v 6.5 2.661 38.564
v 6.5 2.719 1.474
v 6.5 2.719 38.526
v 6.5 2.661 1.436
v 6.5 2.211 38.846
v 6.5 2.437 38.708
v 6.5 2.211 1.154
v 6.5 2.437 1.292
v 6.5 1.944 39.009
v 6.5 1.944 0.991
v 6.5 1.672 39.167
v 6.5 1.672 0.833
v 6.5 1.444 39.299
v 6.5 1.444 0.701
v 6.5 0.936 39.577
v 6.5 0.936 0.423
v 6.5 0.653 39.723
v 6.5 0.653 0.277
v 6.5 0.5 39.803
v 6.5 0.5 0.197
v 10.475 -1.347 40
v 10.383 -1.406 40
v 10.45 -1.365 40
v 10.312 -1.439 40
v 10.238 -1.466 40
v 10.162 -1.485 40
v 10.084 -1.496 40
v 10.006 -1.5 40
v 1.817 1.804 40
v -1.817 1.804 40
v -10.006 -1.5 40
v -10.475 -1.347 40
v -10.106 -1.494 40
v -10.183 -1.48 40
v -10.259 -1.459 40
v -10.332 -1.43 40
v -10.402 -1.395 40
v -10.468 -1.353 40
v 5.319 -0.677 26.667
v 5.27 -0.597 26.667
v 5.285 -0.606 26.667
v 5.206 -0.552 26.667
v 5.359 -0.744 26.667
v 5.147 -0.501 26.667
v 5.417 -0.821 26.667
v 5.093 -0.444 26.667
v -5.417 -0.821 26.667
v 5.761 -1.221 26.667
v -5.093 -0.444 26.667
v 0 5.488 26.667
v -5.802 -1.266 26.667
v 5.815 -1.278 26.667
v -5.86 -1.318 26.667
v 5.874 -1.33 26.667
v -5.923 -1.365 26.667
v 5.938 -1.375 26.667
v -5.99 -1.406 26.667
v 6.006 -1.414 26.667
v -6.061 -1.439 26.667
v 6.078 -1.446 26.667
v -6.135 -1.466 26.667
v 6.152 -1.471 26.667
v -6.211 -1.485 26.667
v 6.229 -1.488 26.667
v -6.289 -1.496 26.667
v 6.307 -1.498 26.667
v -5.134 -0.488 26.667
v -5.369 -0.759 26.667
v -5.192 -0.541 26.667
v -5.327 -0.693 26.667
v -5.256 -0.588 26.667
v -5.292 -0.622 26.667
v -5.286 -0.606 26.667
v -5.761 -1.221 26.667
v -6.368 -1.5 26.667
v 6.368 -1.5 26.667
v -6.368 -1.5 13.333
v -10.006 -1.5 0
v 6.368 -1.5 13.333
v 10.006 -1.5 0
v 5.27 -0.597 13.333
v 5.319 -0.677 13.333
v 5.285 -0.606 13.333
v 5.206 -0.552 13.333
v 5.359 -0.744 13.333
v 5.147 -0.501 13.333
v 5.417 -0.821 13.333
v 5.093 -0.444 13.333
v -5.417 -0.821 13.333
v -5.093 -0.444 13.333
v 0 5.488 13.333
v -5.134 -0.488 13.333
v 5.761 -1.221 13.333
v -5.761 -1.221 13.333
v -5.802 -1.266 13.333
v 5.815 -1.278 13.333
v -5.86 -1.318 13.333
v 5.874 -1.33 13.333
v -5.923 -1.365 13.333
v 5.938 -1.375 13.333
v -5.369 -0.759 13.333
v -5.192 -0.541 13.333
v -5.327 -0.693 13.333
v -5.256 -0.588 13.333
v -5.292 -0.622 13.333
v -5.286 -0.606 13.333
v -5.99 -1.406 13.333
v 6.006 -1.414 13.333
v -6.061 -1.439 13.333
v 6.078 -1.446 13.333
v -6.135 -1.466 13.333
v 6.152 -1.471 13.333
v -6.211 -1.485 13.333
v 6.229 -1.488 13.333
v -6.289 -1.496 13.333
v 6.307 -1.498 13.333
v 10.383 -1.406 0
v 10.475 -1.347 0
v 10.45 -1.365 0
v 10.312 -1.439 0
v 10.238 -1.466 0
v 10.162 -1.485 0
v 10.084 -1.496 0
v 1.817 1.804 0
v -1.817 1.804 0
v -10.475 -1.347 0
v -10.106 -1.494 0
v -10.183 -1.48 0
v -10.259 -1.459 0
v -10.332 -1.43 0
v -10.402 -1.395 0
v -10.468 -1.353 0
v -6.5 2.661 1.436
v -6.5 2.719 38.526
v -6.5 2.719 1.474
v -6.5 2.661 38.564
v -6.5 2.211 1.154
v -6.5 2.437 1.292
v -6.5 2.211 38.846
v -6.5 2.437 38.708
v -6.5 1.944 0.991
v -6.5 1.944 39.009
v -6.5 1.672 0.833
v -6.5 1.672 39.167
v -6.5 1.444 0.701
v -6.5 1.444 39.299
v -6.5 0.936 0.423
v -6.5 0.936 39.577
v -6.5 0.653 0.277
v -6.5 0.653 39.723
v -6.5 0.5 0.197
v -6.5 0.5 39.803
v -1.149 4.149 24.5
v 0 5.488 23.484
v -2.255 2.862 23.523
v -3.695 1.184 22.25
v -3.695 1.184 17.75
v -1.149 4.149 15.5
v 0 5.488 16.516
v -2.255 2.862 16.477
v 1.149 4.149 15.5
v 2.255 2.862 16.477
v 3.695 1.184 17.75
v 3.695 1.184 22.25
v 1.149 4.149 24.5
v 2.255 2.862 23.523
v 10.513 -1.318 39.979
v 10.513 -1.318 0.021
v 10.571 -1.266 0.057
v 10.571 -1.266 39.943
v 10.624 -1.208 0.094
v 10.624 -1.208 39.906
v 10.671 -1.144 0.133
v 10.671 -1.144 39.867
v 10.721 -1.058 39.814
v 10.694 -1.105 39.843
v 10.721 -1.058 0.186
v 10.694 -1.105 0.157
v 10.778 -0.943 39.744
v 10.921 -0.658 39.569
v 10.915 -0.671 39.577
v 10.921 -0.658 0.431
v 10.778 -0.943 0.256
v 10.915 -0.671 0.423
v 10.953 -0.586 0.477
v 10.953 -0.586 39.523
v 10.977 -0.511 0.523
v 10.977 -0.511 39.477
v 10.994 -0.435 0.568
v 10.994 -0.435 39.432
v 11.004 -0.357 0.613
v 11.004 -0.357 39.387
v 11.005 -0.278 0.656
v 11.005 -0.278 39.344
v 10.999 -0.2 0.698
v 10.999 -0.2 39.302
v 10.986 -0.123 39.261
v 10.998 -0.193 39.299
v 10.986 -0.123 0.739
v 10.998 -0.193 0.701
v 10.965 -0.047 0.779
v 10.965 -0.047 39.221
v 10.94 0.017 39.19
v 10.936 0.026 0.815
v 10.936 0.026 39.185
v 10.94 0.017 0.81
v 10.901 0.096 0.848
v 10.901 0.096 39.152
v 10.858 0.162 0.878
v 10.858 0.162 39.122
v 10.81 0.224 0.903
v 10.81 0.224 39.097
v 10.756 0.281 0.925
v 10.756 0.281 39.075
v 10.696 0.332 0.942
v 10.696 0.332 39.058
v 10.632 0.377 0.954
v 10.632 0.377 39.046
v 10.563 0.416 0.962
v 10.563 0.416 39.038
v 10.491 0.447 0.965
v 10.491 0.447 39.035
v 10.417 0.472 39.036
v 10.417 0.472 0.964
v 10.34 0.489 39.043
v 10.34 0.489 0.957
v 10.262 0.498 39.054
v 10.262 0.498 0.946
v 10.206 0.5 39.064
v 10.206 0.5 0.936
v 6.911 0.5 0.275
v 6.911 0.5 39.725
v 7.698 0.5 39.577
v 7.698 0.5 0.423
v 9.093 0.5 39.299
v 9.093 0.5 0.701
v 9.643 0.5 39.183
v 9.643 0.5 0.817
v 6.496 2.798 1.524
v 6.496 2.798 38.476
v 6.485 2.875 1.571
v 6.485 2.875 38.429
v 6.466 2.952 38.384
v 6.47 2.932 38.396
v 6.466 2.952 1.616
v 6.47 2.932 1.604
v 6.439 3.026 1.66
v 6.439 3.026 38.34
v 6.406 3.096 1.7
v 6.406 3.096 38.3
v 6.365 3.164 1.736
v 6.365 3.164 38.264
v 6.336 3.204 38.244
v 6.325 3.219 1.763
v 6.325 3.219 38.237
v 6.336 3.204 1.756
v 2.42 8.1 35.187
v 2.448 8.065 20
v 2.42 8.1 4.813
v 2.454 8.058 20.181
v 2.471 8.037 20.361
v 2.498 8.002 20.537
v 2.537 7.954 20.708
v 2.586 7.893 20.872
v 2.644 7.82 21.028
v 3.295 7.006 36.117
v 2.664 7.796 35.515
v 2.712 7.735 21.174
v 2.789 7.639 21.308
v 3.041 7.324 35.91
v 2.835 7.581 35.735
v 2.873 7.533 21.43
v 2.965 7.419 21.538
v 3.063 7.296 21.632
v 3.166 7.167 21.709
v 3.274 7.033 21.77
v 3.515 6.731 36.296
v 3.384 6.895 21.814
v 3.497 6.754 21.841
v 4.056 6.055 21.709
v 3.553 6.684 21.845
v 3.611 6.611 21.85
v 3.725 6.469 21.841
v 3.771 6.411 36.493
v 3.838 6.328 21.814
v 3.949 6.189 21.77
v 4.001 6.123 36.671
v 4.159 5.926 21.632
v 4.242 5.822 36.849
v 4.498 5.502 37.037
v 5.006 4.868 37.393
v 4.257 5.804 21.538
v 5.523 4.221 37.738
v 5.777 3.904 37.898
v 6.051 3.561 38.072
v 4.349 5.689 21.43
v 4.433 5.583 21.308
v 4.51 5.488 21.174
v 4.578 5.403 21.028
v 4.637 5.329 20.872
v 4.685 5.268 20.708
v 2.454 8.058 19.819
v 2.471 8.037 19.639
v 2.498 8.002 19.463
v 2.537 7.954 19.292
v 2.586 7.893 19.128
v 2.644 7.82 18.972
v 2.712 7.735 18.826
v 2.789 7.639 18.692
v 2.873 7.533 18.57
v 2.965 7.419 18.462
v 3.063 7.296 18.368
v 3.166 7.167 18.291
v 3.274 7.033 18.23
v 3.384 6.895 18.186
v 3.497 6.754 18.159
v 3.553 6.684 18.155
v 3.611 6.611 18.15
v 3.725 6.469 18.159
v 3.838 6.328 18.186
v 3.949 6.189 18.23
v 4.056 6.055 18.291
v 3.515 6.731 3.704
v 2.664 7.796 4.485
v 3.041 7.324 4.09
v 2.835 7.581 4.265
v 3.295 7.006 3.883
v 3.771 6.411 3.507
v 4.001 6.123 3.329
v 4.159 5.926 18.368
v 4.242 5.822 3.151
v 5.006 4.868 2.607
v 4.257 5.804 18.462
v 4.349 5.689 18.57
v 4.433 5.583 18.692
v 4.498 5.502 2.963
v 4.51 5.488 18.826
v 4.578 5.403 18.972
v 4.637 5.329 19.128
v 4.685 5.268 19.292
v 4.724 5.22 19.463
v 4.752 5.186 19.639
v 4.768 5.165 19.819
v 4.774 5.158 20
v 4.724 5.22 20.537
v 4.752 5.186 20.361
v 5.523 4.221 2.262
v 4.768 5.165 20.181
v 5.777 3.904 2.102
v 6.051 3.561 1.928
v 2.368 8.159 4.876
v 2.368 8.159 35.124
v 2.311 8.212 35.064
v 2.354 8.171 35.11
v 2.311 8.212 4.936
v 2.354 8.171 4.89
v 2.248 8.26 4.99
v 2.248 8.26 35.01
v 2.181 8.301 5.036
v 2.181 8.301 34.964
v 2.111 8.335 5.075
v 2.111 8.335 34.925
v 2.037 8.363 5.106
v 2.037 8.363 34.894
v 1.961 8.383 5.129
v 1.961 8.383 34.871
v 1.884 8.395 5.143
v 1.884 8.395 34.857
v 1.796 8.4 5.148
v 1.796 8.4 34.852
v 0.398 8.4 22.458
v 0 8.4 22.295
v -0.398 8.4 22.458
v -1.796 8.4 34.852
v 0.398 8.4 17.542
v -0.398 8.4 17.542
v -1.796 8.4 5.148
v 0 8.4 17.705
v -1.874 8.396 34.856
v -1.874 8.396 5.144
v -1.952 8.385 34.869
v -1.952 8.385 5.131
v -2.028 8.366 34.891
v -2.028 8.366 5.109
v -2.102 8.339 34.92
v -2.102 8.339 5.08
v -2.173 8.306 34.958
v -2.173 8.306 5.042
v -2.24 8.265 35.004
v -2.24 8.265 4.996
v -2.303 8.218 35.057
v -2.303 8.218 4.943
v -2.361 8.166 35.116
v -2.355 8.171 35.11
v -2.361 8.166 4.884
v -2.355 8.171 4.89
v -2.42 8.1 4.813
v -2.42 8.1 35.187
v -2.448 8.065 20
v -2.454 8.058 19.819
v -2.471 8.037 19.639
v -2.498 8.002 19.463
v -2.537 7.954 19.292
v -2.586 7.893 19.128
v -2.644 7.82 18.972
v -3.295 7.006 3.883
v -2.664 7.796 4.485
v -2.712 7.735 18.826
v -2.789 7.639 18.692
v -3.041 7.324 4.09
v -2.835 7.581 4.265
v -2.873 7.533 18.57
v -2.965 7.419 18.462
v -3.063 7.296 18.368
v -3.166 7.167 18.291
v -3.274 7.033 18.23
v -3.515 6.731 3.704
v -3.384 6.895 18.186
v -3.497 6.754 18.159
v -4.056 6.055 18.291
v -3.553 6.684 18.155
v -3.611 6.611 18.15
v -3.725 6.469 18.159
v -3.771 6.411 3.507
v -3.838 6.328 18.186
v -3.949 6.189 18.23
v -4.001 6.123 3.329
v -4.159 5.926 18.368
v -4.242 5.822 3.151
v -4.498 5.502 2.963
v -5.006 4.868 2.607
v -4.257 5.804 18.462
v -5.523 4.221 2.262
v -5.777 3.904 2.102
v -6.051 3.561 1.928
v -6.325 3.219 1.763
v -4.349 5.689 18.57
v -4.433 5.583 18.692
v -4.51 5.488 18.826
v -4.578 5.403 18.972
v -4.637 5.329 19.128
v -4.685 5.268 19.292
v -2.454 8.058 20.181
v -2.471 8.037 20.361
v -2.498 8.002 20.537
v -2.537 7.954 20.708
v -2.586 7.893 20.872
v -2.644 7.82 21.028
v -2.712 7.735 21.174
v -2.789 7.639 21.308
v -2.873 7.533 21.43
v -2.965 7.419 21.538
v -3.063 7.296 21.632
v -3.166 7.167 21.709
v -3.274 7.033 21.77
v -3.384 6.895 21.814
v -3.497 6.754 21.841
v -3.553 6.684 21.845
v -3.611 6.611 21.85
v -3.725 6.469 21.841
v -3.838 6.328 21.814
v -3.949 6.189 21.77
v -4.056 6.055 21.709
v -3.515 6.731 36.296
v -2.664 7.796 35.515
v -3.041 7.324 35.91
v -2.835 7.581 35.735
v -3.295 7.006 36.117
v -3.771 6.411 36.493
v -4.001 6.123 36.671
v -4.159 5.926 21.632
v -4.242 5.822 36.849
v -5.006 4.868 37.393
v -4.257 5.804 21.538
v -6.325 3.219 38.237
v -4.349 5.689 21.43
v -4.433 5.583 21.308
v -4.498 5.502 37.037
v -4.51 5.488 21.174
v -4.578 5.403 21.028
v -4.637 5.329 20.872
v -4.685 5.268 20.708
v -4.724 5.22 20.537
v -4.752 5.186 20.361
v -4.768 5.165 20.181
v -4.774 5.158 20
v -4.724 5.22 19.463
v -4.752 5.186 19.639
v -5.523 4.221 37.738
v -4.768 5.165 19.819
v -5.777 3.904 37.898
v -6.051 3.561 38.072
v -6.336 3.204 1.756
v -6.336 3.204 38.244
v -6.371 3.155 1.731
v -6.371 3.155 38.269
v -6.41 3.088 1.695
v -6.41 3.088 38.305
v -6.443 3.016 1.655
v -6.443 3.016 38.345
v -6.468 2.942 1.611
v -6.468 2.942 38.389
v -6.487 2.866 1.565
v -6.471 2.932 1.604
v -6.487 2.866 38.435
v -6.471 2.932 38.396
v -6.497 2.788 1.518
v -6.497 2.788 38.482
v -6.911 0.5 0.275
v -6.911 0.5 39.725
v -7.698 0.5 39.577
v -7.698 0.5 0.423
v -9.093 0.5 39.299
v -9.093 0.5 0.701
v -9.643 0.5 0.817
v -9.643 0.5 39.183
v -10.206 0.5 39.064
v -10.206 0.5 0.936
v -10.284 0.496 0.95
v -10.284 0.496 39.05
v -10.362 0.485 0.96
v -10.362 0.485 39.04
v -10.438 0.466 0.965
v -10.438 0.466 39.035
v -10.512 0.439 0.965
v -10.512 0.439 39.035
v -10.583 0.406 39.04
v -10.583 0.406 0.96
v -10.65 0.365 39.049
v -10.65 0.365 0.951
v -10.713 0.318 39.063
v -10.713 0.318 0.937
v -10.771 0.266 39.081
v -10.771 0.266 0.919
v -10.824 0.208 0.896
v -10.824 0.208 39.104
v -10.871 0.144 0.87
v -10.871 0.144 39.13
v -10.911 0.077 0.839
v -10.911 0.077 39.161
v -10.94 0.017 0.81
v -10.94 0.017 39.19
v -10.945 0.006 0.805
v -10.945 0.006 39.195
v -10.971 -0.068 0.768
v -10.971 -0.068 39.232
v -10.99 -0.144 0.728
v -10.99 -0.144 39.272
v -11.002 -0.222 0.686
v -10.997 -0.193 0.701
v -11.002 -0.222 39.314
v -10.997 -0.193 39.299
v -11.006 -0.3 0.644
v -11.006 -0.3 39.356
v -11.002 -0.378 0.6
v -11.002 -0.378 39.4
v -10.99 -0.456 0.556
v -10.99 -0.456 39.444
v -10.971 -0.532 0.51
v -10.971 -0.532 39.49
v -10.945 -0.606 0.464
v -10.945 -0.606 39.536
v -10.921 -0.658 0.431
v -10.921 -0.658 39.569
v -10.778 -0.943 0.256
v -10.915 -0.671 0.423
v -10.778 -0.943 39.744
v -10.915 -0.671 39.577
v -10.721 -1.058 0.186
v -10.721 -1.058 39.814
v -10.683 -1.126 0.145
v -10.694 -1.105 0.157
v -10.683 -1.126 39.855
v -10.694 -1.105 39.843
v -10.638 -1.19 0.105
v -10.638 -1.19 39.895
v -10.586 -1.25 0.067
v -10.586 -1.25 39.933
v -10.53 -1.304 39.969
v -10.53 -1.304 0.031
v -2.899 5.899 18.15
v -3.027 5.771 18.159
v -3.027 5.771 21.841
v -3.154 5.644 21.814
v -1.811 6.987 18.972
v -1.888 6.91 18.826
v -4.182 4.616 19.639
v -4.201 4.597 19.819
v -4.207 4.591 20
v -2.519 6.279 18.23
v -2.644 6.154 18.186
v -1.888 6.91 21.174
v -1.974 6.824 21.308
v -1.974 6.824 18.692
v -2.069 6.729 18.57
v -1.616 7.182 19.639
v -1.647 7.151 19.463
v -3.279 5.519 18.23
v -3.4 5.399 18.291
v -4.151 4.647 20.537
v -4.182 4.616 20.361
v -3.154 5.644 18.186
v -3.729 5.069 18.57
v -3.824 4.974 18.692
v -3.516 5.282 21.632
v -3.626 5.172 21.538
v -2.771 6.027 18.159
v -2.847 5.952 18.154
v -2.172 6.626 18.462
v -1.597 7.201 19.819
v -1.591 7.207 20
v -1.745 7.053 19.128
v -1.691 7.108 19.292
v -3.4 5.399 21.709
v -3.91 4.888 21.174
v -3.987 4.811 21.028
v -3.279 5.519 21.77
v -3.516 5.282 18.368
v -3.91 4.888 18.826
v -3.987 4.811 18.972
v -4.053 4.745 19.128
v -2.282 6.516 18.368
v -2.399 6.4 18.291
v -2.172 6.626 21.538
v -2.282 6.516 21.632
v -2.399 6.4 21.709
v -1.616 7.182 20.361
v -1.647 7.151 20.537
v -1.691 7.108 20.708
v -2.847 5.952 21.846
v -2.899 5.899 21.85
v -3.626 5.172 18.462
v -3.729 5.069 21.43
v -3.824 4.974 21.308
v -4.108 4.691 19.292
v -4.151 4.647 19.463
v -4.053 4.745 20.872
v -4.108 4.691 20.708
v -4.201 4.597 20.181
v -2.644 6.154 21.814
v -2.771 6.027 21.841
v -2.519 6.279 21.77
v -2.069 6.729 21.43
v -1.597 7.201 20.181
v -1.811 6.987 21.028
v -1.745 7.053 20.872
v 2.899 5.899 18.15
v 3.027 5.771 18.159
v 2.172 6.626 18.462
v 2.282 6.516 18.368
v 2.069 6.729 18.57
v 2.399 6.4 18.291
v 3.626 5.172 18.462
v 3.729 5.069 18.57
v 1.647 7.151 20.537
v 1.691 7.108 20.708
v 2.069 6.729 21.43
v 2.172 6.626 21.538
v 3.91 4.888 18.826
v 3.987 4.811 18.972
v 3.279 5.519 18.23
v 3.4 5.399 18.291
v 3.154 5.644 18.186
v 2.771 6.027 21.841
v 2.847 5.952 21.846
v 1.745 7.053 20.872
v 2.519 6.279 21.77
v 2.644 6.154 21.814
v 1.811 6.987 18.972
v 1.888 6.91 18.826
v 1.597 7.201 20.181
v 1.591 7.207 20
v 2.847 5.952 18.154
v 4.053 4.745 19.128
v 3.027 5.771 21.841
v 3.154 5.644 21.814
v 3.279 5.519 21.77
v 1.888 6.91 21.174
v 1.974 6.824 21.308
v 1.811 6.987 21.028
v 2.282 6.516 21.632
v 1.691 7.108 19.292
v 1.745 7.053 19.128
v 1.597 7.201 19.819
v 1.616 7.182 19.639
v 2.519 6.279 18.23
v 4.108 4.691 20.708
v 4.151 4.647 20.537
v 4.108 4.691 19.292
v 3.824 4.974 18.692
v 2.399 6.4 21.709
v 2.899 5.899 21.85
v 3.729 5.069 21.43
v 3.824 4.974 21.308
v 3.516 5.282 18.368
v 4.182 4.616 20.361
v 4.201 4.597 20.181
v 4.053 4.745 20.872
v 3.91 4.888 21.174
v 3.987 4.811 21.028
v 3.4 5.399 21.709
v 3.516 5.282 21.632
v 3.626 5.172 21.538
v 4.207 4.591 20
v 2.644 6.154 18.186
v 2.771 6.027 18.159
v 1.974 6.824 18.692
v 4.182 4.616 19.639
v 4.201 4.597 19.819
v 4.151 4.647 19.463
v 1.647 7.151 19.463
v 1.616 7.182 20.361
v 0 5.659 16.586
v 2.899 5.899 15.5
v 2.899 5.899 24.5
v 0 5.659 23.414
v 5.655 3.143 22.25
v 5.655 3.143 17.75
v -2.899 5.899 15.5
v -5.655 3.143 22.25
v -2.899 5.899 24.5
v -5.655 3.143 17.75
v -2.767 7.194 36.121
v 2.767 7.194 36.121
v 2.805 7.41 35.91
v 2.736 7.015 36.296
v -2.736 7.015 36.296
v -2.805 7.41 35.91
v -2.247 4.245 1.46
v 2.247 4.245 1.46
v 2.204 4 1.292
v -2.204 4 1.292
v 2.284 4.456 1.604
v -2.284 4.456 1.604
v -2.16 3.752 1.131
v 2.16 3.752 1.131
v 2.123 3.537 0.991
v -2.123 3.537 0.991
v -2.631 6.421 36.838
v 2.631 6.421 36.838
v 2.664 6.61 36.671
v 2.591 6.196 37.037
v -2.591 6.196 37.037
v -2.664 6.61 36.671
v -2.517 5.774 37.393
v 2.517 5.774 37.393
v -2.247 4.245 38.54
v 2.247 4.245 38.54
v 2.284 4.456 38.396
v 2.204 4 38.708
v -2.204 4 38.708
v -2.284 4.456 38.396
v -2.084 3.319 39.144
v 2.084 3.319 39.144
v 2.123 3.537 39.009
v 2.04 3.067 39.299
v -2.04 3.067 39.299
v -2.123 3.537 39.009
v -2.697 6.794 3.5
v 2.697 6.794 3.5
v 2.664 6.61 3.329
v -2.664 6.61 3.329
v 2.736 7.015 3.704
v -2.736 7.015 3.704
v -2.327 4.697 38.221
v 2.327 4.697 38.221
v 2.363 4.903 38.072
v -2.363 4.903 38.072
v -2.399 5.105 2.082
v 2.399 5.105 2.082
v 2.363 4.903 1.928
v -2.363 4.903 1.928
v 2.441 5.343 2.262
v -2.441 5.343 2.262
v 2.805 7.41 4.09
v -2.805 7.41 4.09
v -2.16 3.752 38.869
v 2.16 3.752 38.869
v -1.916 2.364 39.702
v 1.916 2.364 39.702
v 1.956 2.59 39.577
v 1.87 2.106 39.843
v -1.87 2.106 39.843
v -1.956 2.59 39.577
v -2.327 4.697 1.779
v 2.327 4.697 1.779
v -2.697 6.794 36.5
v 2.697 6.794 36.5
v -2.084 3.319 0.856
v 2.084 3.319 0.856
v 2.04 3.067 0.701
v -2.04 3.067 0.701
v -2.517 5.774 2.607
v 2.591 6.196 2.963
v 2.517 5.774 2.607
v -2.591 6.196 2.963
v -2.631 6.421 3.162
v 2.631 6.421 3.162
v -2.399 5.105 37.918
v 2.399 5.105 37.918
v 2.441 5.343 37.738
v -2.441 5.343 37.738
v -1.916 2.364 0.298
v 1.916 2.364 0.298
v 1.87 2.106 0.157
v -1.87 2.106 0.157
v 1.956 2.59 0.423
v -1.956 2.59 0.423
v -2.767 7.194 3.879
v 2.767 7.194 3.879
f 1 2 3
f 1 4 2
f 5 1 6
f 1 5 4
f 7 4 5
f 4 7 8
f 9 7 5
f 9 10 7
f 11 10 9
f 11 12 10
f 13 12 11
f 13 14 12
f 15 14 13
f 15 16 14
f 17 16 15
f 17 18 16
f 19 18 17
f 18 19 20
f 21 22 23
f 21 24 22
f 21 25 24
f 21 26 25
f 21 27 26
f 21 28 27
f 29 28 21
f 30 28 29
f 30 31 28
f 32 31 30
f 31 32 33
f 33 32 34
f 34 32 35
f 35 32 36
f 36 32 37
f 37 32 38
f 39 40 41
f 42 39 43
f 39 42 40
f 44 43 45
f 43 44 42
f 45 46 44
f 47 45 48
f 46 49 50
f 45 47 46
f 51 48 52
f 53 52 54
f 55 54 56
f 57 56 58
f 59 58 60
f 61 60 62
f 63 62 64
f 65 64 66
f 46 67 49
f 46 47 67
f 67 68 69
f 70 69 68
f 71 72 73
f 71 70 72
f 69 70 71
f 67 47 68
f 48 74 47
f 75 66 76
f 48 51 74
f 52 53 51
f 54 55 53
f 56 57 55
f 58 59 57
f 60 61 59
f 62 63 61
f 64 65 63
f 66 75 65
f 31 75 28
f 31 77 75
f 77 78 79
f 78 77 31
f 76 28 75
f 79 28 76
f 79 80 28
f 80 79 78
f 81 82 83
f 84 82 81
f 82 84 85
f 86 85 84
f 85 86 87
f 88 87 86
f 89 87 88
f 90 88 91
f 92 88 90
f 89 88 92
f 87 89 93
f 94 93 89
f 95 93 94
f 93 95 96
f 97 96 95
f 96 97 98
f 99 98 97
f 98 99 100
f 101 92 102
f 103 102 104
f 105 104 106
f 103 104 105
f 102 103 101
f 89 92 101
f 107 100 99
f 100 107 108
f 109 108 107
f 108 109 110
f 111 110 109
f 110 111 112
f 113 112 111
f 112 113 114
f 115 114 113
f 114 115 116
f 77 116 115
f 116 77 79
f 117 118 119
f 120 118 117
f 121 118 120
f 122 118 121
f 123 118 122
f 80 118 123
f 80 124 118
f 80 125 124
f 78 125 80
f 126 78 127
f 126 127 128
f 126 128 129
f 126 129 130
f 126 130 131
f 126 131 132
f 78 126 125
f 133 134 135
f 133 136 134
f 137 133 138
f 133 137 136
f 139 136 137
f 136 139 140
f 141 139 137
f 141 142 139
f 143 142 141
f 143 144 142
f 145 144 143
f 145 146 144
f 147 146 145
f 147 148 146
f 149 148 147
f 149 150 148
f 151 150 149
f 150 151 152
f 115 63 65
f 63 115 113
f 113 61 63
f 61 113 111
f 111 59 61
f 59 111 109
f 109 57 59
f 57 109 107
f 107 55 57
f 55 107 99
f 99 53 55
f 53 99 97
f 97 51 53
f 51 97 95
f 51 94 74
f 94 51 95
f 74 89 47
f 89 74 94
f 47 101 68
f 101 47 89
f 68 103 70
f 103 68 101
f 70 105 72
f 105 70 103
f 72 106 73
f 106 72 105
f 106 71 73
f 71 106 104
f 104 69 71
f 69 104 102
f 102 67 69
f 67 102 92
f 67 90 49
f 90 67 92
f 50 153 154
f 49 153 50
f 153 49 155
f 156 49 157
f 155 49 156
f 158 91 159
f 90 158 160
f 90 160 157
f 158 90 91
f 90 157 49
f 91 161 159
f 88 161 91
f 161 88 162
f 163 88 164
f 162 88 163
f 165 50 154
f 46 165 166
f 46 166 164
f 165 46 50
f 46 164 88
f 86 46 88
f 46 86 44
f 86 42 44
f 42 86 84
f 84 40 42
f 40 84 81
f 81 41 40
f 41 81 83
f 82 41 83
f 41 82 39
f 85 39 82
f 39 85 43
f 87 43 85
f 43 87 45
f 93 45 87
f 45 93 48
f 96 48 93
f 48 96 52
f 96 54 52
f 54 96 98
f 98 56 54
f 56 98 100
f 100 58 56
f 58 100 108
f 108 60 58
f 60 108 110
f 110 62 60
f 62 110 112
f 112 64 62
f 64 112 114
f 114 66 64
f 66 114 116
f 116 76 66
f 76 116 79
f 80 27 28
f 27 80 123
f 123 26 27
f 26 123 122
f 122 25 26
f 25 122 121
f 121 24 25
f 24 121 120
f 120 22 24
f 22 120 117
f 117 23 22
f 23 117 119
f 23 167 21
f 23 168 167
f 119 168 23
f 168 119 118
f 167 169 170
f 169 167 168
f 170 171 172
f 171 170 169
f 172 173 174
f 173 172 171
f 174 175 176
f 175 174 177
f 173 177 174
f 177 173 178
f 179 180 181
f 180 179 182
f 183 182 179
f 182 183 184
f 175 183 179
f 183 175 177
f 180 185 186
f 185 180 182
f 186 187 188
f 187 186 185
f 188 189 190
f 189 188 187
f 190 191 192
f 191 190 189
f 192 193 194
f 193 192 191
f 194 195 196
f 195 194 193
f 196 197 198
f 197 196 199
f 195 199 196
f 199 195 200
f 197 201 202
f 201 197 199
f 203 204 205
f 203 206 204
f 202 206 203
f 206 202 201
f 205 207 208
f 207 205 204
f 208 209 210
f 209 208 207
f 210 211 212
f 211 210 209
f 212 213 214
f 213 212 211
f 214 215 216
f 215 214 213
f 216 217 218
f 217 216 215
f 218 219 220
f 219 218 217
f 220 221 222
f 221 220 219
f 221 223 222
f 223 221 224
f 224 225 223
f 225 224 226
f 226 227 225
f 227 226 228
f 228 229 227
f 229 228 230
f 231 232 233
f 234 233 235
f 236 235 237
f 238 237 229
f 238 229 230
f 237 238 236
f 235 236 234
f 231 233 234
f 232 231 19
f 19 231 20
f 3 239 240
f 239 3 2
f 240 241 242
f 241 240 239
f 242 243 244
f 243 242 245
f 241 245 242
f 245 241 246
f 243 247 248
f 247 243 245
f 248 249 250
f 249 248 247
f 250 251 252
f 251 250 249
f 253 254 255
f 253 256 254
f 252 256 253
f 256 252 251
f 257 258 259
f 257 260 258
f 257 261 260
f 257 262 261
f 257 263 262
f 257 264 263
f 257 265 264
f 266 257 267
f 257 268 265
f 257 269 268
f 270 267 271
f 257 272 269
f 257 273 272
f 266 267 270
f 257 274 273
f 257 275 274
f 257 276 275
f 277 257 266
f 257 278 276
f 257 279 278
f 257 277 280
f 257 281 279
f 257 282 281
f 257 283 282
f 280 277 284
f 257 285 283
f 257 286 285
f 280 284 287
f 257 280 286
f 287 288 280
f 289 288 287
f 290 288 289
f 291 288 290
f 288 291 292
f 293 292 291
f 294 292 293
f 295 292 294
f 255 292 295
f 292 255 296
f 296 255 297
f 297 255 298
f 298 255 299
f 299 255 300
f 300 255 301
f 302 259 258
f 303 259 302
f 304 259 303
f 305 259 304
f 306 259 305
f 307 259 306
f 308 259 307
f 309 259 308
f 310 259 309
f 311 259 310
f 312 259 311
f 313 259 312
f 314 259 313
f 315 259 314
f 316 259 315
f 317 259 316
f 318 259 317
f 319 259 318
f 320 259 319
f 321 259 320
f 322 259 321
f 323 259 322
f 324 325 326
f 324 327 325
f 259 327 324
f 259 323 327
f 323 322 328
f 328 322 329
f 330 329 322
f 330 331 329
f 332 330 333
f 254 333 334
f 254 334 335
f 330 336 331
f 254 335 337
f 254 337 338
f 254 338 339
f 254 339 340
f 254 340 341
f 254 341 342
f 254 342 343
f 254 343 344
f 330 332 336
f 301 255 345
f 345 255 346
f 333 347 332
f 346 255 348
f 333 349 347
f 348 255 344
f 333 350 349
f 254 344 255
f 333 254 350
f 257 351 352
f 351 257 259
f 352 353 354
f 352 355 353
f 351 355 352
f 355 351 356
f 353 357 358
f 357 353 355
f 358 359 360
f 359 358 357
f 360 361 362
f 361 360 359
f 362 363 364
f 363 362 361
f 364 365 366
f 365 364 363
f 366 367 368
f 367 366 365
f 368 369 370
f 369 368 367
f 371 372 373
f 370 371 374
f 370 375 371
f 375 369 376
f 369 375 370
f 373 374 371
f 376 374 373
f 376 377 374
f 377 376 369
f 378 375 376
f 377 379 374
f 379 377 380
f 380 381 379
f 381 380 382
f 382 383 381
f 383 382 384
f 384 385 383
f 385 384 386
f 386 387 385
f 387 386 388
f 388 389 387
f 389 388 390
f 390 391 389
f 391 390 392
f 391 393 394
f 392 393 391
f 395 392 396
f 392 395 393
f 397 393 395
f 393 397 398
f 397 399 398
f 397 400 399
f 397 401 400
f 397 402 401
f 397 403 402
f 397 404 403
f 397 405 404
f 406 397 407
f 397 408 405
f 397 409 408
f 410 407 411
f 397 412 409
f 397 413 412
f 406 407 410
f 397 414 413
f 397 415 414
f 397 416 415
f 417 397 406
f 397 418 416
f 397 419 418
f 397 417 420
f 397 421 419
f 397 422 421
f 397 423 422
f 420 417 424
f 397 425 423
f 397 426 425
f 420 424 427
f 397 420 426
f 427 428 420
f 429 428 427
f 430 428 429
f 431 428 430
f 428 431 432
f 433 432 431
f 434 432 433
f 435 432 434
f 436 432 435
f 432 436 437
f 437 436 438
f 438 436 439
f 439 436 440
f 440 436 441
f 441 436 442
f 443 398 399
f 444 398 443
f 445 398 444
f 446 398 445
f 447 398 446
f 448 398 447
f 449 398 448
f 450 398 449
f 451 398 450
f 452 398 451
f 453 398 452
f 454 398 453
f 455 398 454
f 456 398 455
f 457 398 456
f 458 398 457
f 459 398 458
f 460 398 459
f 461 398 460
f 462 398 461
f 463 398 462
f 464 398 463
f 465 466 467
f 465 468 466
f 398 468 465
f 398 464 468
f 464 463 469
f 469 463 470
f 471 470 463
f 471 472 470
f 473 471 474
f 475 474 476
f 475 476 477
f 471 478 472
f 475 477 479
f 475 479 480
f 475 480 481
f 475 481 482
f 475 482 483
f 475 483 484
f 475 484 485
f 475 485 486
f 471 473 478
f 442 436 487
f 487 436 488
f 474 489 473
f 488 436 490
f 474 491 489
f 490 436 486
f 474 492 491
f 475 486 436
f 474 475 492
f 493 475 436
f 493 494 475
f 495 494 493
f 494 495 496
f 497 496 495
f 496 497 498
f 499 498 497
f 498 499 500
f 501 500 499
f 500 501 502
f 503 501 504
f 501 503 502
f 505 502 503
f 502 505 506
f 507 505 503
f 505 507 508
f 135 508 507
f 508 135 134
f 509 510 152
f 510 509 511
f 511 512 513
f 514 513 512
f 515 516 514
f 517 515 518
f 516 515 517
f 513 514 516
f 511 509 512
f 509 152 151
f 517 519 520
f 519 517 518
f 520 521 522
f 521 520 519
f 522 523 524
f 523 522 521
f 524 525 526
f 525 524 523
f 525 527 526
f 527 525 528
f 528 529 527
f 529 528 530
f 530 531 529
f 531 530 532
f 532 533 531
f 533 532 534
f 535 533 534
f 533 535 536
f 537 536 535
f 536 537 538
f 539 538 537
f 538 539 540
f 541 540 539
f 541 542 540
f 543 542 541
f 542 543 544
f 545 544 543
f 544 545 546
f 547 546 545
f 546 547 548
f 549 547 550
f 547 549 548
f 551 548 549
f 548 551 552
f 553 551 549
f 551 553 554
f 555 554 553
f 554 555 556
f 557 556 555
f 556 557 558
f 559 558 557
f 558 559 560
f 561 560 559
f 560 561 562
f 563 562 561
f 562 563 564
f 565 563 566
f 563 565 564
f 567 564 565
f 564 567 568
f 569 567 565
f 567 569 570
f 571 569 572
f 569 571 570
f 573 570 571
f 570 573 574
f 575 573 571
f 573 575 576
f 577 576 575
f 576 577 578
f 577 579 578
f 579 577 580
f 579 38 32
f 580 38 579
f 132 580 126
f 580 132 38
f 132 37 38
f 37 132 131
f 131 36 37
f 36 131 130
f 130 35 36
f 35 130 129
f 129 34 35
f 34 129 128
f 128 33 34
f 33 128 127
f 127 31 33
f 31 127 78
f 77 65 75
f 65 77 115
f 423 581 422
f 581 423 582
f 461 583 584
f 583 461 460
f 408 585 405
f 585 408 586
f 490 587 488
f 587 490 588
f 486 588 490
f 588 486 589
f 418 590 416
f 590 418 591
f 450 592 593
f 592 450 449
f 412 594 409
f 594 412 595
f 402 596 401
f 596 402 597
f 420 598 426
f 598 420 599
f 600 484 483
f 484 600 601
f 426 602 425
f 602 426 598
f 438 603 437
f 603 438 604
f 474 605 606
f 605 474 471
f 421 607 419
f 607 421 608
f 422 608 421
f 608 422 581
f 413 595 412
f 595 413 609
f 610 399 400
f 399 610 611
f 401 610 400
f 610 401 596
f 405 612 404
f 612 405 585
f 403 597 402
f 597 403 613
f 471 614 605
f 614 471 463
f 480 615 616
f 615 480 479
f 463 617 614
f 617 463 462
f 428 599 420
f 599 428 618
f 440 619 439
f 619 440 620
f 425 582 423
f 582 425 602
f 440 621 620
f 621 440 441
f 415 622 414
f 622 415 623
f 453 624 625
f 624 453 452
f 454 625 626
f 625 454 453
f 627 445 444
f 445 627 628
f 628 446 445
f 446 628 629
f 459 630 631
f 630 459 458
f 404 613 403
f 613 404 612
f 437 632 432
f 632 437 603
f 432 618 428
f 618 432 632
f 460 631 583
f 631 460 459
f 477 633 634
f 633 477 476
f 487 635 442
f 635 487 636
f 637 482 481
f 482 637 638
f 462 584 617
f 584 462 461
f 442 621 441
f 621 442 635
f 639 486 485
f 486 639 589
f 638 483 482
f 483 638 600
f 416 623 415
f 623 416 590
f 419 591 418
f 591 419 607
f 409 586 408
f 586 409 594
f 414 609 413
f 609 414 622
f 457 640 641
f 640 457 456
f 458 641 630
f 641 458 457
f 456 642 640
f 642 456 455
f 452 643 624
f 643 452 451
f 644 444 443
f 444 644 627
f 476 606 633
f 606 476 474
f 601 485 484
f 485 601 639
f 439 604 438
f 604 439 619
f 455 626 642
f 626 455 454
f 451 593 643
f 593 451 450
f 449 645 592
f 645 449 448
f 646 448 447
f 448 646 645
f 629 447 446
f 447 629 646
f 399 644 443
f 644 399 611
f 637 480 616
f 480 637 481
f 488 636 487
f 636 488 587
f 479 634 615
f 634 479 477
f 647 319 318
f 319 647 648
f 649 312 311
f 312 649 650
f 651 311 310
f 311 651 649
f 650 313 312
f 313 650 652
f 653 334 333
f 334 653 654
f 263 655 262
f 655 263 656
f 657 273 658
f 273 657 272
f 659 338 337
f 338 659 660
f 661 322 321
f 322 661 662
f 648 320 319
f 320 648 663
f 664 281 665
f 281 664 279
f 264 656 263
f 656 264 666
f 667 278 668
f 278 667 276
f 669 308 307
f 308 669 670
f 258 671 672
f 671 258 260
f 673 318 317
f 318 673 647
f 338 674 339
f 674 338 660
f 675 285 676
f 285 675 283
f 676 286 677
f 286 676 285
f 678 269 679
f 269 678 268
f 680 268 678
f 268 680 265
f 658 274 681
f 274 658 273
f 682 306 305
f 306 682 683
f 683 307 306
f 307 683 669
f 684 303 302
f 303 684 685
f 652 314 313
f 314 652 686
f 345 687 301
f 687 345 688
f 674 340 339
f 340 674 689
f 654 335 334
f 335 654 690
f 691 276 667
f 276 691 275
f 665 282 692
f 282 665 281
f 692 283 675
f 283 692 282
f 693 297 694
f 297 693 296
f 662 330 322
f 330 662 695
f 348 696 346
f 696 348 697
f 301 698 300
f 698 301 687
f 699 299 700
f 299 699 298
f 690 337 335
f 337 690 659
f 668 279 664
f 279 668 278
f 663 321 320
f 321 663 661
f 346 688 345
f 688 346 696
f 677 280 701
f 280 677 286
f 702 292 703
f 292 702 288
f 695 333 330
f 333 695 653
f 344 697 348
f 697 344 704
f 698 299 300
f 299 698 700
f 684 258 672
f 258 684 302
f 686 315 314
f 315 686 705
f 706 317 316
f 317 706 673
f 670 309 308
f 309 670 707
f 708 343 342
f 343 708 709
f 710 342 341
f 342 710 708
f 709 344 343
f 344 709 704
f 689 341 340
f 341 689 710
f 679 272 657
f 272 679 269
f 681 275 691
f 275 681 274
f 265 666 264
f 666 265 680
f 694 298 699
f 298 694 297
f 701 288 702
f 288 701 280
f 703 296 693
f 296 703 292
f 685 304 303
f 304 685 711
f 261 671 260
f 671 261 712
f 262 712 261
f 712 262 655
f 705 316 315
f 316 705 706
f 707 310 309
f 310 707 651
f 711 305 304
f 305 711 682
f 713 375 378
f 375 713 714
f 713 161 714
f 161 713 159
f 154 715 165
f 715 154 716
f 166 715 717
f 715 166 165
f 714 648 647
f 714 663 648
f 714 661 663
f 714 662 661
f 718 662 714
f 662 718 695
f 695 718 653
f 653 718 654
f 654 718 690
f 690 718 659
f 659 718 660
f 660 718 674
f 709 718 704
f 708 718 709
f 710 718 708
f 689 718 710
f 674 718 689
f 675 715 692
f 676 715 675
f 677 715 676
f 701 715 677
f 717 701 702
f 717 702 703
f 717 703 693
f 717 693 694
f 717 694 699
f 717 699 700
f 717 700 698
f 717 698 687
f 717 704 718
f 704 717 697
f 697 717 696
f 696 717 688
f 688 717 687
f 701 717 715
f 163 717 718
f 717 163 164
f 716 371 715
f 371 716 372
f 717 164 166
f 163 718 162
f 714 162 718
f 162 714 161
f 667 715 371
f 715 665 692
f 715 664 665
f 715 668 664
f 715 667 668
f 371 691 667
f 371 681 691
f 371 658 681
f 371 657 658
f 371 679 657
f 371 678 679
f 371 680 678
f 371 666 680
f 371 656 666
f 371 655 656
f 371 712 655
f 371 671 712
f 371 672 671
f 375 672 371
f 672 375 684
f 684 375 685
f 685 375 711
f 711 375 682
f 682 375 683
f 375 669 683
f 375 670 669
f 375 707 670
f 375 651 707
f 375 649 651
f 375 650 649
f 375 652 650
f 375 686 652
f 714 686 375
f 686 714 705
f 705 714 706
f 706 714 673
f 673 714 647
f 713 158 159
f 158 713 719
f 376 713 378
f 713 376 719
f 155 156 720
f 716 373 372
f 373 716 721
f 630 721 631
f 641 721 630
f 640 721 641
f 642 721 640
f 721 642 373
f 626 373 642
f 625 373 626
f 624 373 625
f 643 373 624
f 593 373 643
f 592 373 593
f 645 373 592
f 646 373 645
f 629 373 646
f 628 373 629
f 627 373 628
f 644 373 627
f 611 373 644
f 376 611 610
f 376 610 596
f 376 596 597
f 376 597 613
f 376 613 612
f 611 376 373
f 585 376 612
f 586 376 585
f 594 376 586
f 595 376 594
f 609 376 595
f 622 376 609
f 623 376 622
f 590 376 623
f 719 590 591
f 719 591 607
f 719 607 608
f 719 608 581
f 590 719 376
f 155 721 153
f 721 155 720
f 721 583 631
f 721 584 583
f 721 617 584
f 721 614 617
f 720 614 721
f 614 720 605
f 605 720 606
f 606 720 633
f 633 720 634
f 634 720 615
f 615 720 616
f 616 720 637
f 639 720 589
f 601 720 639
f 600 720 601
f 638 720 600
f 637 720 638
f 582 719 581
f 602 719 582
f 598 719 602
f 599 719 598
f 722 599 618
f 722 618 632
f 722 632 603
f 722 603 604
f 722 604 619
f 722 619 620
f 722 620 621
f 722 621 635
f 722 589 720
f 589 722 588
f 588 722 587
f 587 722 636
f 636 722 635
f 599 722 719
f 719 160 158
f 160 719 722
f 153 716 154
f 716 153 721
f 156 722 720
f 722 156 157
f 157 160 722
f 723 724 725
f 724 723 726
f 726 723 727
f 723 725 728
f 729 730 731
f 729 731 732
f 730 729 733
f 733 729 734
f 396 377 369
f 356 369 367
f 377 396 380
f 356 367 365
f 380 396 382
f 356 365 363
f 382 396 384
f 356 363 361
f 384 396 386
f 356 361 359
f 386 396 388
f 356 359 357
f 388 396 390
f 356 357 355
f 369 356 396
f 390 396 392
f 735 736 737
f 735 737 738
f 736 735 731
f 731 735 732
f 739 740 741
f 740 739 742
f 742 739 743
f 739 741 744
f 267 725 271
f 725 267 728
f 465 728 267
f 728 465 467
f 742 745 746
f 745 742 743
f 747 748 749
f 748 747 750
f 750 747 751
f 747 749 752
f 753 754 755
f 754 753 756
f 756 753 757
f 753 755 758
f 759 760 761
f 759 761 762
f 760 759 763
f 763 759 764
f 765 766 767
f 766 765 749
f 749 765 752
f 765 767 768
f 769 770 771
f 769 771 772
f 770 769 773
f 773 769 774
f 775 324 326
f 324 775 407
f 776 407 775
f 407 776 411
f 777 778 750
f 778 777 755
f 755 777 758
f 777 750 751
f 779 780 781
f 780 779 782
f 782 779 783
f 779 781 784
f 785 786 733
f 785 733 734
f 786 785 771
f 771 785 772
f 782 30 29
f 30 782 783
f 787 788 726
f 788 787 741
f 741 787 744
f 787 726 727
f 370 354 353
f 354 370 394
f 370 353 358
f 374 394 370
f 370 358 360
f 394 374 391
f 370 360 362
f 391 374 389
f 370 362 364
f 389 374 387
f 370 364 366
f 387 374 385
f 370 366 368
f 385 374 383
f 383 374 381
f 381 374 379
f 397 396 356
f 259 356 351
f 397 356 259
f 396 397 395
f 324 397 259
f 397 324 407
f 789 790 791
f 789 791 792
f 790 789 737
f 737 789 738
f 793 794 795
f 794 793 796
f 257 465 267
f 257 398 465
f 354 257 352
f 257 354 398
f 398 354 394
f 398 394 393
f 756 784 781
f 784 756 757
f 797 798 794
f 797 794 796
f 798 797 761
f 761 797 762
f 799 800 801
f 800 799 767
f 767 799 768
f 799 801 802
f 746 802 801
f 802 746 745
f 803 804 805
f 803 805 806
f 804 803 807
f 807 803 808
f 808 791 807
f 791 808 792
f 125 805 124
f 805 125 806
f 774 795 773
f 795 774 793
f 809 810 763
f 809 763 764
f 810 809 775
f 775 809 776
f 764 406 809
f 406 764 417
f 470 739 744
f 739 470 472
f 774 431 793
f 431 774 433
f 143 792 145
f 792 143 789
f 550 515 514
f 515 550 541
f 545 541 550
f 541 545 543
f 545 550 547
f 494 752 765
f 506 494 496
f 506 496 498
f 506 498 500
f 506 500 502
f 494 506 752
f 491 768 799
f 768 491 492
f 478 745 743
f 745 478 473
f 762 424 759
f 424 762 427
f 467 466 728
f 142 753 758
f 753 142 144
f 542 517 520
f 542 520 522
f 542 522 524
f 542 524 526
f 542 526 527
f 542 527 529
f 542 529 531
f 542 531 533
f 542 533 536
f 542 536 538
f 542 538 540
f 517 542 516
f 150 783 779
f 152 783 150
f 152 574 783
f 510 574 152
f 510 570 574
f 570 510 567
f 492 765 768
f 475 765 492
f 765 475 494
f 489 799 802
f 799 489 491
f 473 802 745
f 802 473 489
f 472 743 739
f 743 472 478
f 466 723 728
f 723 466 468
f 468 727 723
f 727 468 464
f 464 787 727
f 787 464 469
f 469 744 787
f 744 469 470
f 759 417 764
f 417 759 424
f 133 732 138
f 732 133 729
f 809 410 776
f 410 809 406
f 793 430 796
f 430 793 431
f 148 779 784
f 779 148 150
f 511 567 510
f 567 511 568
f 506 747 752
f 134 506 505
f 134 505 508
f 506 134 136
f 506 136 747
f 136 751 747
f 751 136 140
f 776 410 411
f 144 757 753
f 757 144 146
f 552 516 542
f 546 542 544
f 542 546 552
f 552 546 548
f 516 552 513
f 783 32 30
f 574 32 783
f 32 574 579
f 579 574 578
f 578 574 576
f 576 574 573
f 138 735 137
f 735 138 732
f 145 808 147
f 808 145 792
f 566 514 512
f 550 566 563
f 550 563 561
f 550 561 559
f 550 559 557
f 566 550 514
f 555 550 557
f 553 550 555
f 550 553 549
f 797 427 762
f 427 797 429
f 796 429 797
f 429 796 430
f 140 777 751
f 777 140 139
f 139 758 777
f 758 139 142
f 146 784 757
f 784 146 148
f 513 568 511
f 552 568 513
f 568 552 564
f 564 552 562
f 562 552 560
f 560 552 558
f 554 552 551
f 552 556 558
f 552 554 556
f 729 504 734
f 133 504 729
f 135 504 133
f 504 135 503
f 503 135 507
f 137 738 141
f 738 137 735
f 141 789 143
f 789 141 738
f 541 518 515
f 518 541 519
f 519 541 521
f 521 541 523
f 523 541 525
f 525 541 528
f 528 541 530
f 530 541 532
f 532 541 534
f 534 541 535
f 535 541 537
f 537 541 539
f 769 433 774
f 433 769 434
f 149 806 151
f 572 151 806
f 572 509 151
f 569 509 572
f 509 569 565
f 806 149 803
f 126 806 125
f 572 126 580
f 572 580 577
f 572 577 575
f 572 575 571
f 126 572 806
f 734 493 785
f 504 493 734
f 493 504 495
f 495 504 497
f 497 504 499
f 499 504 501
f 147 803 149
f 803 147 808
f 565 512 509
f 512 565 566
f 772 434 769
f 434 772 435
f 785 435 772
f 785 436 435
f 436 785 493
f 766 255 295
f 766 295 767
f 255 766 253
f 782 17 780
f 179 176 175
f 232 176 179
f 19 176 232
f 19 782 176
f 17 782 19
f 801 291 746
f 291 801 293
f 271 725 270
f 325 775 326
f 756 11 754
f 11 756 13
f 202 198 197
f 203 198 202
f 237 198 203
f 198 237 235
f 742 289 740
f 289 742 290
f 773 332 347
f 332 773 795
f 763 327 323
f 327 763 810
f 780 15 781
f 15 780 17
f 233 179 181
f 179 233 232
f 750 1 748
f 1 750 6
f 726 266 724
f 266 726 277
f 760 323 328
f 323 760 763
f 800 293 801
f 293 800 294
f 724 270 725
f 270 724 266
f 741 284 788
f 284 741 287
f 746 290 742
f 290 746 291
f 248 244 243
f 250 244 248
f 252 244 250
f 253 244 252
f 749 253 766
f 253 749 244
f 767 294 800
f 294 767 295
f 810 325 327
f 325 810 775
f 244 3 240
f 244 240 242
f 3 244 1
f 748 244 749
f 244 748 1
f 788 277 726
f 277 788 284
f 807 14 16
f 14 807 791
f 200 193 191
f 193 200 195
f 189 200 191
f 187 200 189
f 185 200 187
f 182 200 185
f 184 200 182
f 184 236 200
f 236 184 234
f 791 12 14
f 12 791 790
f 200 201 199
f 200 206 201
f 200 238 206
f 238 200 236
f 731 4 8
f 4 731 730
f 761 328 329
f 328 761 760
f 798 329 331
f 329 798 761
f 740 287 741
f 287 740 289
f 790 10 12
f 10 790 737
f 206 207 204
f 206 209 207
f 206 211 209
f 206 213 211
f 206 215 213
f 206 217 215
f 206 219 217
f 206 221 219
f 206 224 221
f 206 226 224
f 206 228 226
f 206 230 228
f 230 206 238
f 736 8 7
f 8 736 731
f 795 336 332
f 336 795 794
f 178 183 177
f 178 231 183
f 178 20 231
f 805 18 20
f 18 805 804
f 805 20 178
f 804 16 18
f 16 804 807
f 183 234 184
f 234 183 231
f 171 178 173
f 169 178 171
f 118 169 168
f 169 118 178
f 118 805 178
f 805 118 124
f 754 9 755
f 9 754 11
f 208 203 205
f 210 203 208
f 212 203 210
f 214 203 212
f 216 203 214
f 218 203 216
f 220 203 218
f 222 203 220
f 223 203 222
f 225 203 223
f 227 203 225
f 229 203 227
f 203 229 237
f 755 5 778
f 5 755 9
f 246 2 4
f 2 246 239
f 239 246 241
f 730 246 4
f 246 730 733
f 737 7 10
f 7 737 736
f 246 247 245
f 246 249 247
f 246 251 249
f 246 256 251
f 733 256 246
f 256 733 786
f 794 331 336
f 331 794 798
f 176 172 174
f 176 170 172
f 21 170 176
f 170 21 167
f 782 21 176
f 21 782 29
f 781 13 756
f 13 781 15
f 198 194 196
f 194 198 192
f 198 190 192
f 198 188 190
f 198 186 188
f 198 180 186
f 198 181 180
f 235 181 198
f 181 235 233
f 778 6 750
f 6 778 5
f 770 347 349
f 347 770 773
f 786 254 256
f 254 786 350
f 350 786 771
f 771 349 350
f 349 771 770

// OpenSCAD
module triangleSlicer(divider, rs, h, d, cutD) {
  slice = divider * 1.5;
  
  translate([-divider / 2 - 1, divider / 2 + 1, -1])
    linear_extrude(h + 2, convexity = 2)        
      polygon([
        [-slice, -slice], 
        [slice, slice],
        [slice, -slice],
      ]);
  
  cw = divider;
  
  for (rz= [0, 1])
    mirror([rz, rz, 0])
      translate([
        -divider * 2 + cw - 0.1, 
        -1.5, 
        (h) / 2
      ])
        cube([cw, cw, h + 2], center = true);
  
  for (zr = rs) {
    y = cos(22.5) * (cutD / 2 + d / 2);
    rotate([0, 0, zr + 45])
      translate([0, y, -1])
        cylinder(d = cutD * 1.01, h = h + 2, $fn = 128);
  }
}

module supports(h, d, sides = 4, divider = 5, backT = 2, backOnly = false) { 
  separation = divider + 0.4 * 6 * 2;
  cutD = (d - separation);
  $fn = 64;
  
  rs = (
    (sides == 4) ? 
      [0, 90, 180, 270] :
        (
          (sides == 2) ? 
            [0, 270] :
              [0]
        )
  );
  
  edgeH = 5;
  edgeW = 3; 
   
  if (!backOnly) {
    intersection() {
      difference() {
        union () {
          cutD = (d * 1.5 - separation);
          linear_extrude(h) 
            offset(r = 1) 
              offset(delta = -1) { 
                intersection() {
                  difference() {
                    square(d * 1.5, center = true);
                     
                    for (i = rs) {
                      y = cos(22.5) * (cutD / 2 + d * 1.5 / 2) - 3.4;
                      rotate([0, 0, i + 45])
                        translate([0, y, 0])
                          circle(d = cutD, $fn = 256);
                    }
                   
                    rotate([0, 0, 45]) 
                      translate([0, 2, 0])
                        square([d / 2, d / 2], center = true); 
                    
                    for (m = [0, 1]) {
                      mirror([m, m, 0])
                        rotate([0, 0, 180])
                          translate([(d * 1.5 /  2) - divider / 2, -1, 0])
                            square([divider * 2, divider - 0.8], center = true); 
                      }
                    }
                  
                  // needed to trim excess sides
                  for (i = rs) {
                    y = cos(22.5) * (cutD / 2 + d / 2);
                    rotate([0, 0, i + 45])
                      translate([0, y / 1.5, 0])
                        circle(d = cutD, $fn = 64);
                  }
                }
              }
        }
          
        for (zr = rs) {
          for (zs = [20])
            rotate([0, 0, zr])
              translate([0, 0, zs])   
                rotate([0, 90, 135])
                  translate([0, 0, -d / 2]) {
                    cylinder(d = 3.5, h = d);            
                    
                    translate([0, 0, d - 2.2])
                        cylinder(d = 6.8, h = 3, $fn = 6);
                  }
        }
      }

     rotate([90, 0, -45])
        translate([16, h / 2, 0]) {
          intersection(){
          cylinder(d = h + 16, h = d, center = true, $fn = 256);
      
        rotate([0, 15, 0])
          cylinder(d = h + 16, h = d * 2, center = true, $fn = 256);
      
      
        rotate([0, -15, 0])
          cylinder(d = h + 16, h = d * 2, center = true, $fn = 256);
          }
      }
    }
  }
  
  if (backOnly && (sides == 1 || sides == 0)) {
    *rotate([0, 0, -45]) translate([-17.8, -20, 0]) cube([10, 40, 10]);
    
    intersection() {
      difference() {
        off = 2.5;
        step = 0;
        $fn = 64;
        
        linear_extrude(h, convexity = 3)
          offset(r = .5) 
            offset(delta = -.5)
              polygon([
                [-divider + backT - 2.5 - 1.5, -off - backT + 3],
                [-d / 2 - divider / 2, -off - backT + 3],
                [-d / 2 - divider / 2 + 2, -off + 3],
                [-divider - off, -off + 3],
                [-divider - off, step + 3.75],
                [-divider - backT + 2.5, step + 3.75],
                
                [-step - 3.75, divider + backT - 2.5],
                [-step - 3.75, divider + off],
                [off - 3, divider + off],
                [off - 3, d / 2 + divider / 2 - 2],
                [off + backT - 3, d / 2 + divider / 2],
                [off + backT - 3, divider - backT + 2.5 + 1.5]
              ]);
      
        for (zr = rs) {
          for (zs = [20])
            rotate([0, 0, zr])
              translate([0, 0, zs])    
                rotate([0, 90, 135]) {
                  translate([0, 0, -d / 2])
                    cylinder(d = 3.75, h = d);
                }
              }
      
      }
      
      rotate([90, 0, -45])
        translate([14, h / 2, 0]) {
          intersection(){
          cylinder(d = h + 16, h = d, center = true, $fn = 256);
      
        rotate([0, 15, 0])
          cylinder(d = h + 16, h = d * 2, center = true, $fn = 256);
      
      
        rotate([0, -15, 0])
          cylinder(d = h + 16, h = d * 2, center = true, $fn = 256);
          }
      }
    }
  }
  
  if (backOnly && sides == 2) {
    intersection() {
      difference() {
        off = 2.5;
        step = 0;
        $fn = 64;
        
        union() {
          linear_extrude(h, convexity = 3)
            offset(r = 0.8) 
              offset(delta = -0.8)
                union()
                  for (zm = [0, 1])
                    mirror([zm, 0, 0])
                      translate([1, 0, 0])
                         polygon([
                          [-divider + backT - 4, -off - backT + 3],
                          [-d / 2 - divider / 2 + 1, -off - backT + 3],
                          [-d / 2 - divider / 2, -off + 3],
                          [-divider - off, -off + 3],
                          [-divider - off, step + 3.75 - .75],
                          
                          [-step - 3.5, divider - backT + 5],
                          [-step - 3.5, divider - backT + 5.4],
                          [off + backT - 3, divider  - backT + 5.4]
                     ]);
                  
        for (zr = rs) 
          mirror([zr, 0, 0]) {
            translate([0, -1.5, h - h / 3])
              cube([6.5, 4, h / 3]);
          
            translate([0, .5, h - h / 3])
              cube([3, 5, h / 3]);
            
            
            translate([0, -1.5, 0])
              cube([6.5, 4, h / 3]);
          
            translate([0, .5, 0])
              cube([3, 5, h / 3]);
          }
        }
                
        for (zr = rs) {
          for (zs = [20])
            mirror([zr, 0, 0])
              translate([0, 3, zs])    
                rotate([0, 90, 135]) {
                  translate([0, 0, 0])
                    cylinder(d = 3.7, h = d / 2);
                  }
              }
     
        for (zr = rs) 
          mirror([zr, 0, 0])
            translate([-0, 3, 20])
              rotate([0, 90, 45])
                translate([0, 0, -0.5])
                  cylinder(d = 9, h = 4.6, $fn = 6);
  
  }
    
      rotate([90, 0, -90])
        translate([8.5, h / 2, 0]) {
          intersection(){
            cylinder(d = h + 5, h = d * 1.5, center = true, $fn = 256);
      
            rotate([0, 20, 0])
              cylinder(d = h + 5, h = d * 2 * 1.5, center = true, $fn = 256);
          
          
            rotate([0, -20, 0])
              cylinder(d = h + 5, h = d * 2 * 1.5, center = true, $fn = 256);
          }
      }  
    }
  }
}

*translate([30, 0, 0])
  supports(40, 20, sides = 4);


group() {
  %group() {
    translate([0 + 6.25 + .25, .5, 0])
      cube([5, 5, 40]);
    
    translate([0 - 6.25 - 5.25, .5, 0])
      cube([5, 5, 40]);

    translate([0 - 2.5, 4.75 + 1.25, 0])
      cube([5, 5, 40]);
  }

  translate([0, 0, 0]) {
    translate([0.6, 2.4, 0])
      supports(40, 20, sides = 1, backOnly = false);
   
    translate([-0.6, 2.4, 0])
      rotate([0, 0, -90])
        supports(40, 20, sides = 1, backOnly = false);
  }

 !  supports(40, 20, sides = 2, backOnly = true);
}

translate([25, 0, 0]) {
  %group("green") {
    translate([0 - 6.5 - 6, 0.5, 0])
      cube([5, 5, 40]);

    translate([0 - 5.5, 6.25 + 1.25, 0])
      cube([5, 5, 40]);
  }

  translate([-2.4, 2.4, 0])
  supports(40, 20, sides = 1, backOnly = false);
  
  supports(40, 20, sides = 1, backOnly = true);
}
